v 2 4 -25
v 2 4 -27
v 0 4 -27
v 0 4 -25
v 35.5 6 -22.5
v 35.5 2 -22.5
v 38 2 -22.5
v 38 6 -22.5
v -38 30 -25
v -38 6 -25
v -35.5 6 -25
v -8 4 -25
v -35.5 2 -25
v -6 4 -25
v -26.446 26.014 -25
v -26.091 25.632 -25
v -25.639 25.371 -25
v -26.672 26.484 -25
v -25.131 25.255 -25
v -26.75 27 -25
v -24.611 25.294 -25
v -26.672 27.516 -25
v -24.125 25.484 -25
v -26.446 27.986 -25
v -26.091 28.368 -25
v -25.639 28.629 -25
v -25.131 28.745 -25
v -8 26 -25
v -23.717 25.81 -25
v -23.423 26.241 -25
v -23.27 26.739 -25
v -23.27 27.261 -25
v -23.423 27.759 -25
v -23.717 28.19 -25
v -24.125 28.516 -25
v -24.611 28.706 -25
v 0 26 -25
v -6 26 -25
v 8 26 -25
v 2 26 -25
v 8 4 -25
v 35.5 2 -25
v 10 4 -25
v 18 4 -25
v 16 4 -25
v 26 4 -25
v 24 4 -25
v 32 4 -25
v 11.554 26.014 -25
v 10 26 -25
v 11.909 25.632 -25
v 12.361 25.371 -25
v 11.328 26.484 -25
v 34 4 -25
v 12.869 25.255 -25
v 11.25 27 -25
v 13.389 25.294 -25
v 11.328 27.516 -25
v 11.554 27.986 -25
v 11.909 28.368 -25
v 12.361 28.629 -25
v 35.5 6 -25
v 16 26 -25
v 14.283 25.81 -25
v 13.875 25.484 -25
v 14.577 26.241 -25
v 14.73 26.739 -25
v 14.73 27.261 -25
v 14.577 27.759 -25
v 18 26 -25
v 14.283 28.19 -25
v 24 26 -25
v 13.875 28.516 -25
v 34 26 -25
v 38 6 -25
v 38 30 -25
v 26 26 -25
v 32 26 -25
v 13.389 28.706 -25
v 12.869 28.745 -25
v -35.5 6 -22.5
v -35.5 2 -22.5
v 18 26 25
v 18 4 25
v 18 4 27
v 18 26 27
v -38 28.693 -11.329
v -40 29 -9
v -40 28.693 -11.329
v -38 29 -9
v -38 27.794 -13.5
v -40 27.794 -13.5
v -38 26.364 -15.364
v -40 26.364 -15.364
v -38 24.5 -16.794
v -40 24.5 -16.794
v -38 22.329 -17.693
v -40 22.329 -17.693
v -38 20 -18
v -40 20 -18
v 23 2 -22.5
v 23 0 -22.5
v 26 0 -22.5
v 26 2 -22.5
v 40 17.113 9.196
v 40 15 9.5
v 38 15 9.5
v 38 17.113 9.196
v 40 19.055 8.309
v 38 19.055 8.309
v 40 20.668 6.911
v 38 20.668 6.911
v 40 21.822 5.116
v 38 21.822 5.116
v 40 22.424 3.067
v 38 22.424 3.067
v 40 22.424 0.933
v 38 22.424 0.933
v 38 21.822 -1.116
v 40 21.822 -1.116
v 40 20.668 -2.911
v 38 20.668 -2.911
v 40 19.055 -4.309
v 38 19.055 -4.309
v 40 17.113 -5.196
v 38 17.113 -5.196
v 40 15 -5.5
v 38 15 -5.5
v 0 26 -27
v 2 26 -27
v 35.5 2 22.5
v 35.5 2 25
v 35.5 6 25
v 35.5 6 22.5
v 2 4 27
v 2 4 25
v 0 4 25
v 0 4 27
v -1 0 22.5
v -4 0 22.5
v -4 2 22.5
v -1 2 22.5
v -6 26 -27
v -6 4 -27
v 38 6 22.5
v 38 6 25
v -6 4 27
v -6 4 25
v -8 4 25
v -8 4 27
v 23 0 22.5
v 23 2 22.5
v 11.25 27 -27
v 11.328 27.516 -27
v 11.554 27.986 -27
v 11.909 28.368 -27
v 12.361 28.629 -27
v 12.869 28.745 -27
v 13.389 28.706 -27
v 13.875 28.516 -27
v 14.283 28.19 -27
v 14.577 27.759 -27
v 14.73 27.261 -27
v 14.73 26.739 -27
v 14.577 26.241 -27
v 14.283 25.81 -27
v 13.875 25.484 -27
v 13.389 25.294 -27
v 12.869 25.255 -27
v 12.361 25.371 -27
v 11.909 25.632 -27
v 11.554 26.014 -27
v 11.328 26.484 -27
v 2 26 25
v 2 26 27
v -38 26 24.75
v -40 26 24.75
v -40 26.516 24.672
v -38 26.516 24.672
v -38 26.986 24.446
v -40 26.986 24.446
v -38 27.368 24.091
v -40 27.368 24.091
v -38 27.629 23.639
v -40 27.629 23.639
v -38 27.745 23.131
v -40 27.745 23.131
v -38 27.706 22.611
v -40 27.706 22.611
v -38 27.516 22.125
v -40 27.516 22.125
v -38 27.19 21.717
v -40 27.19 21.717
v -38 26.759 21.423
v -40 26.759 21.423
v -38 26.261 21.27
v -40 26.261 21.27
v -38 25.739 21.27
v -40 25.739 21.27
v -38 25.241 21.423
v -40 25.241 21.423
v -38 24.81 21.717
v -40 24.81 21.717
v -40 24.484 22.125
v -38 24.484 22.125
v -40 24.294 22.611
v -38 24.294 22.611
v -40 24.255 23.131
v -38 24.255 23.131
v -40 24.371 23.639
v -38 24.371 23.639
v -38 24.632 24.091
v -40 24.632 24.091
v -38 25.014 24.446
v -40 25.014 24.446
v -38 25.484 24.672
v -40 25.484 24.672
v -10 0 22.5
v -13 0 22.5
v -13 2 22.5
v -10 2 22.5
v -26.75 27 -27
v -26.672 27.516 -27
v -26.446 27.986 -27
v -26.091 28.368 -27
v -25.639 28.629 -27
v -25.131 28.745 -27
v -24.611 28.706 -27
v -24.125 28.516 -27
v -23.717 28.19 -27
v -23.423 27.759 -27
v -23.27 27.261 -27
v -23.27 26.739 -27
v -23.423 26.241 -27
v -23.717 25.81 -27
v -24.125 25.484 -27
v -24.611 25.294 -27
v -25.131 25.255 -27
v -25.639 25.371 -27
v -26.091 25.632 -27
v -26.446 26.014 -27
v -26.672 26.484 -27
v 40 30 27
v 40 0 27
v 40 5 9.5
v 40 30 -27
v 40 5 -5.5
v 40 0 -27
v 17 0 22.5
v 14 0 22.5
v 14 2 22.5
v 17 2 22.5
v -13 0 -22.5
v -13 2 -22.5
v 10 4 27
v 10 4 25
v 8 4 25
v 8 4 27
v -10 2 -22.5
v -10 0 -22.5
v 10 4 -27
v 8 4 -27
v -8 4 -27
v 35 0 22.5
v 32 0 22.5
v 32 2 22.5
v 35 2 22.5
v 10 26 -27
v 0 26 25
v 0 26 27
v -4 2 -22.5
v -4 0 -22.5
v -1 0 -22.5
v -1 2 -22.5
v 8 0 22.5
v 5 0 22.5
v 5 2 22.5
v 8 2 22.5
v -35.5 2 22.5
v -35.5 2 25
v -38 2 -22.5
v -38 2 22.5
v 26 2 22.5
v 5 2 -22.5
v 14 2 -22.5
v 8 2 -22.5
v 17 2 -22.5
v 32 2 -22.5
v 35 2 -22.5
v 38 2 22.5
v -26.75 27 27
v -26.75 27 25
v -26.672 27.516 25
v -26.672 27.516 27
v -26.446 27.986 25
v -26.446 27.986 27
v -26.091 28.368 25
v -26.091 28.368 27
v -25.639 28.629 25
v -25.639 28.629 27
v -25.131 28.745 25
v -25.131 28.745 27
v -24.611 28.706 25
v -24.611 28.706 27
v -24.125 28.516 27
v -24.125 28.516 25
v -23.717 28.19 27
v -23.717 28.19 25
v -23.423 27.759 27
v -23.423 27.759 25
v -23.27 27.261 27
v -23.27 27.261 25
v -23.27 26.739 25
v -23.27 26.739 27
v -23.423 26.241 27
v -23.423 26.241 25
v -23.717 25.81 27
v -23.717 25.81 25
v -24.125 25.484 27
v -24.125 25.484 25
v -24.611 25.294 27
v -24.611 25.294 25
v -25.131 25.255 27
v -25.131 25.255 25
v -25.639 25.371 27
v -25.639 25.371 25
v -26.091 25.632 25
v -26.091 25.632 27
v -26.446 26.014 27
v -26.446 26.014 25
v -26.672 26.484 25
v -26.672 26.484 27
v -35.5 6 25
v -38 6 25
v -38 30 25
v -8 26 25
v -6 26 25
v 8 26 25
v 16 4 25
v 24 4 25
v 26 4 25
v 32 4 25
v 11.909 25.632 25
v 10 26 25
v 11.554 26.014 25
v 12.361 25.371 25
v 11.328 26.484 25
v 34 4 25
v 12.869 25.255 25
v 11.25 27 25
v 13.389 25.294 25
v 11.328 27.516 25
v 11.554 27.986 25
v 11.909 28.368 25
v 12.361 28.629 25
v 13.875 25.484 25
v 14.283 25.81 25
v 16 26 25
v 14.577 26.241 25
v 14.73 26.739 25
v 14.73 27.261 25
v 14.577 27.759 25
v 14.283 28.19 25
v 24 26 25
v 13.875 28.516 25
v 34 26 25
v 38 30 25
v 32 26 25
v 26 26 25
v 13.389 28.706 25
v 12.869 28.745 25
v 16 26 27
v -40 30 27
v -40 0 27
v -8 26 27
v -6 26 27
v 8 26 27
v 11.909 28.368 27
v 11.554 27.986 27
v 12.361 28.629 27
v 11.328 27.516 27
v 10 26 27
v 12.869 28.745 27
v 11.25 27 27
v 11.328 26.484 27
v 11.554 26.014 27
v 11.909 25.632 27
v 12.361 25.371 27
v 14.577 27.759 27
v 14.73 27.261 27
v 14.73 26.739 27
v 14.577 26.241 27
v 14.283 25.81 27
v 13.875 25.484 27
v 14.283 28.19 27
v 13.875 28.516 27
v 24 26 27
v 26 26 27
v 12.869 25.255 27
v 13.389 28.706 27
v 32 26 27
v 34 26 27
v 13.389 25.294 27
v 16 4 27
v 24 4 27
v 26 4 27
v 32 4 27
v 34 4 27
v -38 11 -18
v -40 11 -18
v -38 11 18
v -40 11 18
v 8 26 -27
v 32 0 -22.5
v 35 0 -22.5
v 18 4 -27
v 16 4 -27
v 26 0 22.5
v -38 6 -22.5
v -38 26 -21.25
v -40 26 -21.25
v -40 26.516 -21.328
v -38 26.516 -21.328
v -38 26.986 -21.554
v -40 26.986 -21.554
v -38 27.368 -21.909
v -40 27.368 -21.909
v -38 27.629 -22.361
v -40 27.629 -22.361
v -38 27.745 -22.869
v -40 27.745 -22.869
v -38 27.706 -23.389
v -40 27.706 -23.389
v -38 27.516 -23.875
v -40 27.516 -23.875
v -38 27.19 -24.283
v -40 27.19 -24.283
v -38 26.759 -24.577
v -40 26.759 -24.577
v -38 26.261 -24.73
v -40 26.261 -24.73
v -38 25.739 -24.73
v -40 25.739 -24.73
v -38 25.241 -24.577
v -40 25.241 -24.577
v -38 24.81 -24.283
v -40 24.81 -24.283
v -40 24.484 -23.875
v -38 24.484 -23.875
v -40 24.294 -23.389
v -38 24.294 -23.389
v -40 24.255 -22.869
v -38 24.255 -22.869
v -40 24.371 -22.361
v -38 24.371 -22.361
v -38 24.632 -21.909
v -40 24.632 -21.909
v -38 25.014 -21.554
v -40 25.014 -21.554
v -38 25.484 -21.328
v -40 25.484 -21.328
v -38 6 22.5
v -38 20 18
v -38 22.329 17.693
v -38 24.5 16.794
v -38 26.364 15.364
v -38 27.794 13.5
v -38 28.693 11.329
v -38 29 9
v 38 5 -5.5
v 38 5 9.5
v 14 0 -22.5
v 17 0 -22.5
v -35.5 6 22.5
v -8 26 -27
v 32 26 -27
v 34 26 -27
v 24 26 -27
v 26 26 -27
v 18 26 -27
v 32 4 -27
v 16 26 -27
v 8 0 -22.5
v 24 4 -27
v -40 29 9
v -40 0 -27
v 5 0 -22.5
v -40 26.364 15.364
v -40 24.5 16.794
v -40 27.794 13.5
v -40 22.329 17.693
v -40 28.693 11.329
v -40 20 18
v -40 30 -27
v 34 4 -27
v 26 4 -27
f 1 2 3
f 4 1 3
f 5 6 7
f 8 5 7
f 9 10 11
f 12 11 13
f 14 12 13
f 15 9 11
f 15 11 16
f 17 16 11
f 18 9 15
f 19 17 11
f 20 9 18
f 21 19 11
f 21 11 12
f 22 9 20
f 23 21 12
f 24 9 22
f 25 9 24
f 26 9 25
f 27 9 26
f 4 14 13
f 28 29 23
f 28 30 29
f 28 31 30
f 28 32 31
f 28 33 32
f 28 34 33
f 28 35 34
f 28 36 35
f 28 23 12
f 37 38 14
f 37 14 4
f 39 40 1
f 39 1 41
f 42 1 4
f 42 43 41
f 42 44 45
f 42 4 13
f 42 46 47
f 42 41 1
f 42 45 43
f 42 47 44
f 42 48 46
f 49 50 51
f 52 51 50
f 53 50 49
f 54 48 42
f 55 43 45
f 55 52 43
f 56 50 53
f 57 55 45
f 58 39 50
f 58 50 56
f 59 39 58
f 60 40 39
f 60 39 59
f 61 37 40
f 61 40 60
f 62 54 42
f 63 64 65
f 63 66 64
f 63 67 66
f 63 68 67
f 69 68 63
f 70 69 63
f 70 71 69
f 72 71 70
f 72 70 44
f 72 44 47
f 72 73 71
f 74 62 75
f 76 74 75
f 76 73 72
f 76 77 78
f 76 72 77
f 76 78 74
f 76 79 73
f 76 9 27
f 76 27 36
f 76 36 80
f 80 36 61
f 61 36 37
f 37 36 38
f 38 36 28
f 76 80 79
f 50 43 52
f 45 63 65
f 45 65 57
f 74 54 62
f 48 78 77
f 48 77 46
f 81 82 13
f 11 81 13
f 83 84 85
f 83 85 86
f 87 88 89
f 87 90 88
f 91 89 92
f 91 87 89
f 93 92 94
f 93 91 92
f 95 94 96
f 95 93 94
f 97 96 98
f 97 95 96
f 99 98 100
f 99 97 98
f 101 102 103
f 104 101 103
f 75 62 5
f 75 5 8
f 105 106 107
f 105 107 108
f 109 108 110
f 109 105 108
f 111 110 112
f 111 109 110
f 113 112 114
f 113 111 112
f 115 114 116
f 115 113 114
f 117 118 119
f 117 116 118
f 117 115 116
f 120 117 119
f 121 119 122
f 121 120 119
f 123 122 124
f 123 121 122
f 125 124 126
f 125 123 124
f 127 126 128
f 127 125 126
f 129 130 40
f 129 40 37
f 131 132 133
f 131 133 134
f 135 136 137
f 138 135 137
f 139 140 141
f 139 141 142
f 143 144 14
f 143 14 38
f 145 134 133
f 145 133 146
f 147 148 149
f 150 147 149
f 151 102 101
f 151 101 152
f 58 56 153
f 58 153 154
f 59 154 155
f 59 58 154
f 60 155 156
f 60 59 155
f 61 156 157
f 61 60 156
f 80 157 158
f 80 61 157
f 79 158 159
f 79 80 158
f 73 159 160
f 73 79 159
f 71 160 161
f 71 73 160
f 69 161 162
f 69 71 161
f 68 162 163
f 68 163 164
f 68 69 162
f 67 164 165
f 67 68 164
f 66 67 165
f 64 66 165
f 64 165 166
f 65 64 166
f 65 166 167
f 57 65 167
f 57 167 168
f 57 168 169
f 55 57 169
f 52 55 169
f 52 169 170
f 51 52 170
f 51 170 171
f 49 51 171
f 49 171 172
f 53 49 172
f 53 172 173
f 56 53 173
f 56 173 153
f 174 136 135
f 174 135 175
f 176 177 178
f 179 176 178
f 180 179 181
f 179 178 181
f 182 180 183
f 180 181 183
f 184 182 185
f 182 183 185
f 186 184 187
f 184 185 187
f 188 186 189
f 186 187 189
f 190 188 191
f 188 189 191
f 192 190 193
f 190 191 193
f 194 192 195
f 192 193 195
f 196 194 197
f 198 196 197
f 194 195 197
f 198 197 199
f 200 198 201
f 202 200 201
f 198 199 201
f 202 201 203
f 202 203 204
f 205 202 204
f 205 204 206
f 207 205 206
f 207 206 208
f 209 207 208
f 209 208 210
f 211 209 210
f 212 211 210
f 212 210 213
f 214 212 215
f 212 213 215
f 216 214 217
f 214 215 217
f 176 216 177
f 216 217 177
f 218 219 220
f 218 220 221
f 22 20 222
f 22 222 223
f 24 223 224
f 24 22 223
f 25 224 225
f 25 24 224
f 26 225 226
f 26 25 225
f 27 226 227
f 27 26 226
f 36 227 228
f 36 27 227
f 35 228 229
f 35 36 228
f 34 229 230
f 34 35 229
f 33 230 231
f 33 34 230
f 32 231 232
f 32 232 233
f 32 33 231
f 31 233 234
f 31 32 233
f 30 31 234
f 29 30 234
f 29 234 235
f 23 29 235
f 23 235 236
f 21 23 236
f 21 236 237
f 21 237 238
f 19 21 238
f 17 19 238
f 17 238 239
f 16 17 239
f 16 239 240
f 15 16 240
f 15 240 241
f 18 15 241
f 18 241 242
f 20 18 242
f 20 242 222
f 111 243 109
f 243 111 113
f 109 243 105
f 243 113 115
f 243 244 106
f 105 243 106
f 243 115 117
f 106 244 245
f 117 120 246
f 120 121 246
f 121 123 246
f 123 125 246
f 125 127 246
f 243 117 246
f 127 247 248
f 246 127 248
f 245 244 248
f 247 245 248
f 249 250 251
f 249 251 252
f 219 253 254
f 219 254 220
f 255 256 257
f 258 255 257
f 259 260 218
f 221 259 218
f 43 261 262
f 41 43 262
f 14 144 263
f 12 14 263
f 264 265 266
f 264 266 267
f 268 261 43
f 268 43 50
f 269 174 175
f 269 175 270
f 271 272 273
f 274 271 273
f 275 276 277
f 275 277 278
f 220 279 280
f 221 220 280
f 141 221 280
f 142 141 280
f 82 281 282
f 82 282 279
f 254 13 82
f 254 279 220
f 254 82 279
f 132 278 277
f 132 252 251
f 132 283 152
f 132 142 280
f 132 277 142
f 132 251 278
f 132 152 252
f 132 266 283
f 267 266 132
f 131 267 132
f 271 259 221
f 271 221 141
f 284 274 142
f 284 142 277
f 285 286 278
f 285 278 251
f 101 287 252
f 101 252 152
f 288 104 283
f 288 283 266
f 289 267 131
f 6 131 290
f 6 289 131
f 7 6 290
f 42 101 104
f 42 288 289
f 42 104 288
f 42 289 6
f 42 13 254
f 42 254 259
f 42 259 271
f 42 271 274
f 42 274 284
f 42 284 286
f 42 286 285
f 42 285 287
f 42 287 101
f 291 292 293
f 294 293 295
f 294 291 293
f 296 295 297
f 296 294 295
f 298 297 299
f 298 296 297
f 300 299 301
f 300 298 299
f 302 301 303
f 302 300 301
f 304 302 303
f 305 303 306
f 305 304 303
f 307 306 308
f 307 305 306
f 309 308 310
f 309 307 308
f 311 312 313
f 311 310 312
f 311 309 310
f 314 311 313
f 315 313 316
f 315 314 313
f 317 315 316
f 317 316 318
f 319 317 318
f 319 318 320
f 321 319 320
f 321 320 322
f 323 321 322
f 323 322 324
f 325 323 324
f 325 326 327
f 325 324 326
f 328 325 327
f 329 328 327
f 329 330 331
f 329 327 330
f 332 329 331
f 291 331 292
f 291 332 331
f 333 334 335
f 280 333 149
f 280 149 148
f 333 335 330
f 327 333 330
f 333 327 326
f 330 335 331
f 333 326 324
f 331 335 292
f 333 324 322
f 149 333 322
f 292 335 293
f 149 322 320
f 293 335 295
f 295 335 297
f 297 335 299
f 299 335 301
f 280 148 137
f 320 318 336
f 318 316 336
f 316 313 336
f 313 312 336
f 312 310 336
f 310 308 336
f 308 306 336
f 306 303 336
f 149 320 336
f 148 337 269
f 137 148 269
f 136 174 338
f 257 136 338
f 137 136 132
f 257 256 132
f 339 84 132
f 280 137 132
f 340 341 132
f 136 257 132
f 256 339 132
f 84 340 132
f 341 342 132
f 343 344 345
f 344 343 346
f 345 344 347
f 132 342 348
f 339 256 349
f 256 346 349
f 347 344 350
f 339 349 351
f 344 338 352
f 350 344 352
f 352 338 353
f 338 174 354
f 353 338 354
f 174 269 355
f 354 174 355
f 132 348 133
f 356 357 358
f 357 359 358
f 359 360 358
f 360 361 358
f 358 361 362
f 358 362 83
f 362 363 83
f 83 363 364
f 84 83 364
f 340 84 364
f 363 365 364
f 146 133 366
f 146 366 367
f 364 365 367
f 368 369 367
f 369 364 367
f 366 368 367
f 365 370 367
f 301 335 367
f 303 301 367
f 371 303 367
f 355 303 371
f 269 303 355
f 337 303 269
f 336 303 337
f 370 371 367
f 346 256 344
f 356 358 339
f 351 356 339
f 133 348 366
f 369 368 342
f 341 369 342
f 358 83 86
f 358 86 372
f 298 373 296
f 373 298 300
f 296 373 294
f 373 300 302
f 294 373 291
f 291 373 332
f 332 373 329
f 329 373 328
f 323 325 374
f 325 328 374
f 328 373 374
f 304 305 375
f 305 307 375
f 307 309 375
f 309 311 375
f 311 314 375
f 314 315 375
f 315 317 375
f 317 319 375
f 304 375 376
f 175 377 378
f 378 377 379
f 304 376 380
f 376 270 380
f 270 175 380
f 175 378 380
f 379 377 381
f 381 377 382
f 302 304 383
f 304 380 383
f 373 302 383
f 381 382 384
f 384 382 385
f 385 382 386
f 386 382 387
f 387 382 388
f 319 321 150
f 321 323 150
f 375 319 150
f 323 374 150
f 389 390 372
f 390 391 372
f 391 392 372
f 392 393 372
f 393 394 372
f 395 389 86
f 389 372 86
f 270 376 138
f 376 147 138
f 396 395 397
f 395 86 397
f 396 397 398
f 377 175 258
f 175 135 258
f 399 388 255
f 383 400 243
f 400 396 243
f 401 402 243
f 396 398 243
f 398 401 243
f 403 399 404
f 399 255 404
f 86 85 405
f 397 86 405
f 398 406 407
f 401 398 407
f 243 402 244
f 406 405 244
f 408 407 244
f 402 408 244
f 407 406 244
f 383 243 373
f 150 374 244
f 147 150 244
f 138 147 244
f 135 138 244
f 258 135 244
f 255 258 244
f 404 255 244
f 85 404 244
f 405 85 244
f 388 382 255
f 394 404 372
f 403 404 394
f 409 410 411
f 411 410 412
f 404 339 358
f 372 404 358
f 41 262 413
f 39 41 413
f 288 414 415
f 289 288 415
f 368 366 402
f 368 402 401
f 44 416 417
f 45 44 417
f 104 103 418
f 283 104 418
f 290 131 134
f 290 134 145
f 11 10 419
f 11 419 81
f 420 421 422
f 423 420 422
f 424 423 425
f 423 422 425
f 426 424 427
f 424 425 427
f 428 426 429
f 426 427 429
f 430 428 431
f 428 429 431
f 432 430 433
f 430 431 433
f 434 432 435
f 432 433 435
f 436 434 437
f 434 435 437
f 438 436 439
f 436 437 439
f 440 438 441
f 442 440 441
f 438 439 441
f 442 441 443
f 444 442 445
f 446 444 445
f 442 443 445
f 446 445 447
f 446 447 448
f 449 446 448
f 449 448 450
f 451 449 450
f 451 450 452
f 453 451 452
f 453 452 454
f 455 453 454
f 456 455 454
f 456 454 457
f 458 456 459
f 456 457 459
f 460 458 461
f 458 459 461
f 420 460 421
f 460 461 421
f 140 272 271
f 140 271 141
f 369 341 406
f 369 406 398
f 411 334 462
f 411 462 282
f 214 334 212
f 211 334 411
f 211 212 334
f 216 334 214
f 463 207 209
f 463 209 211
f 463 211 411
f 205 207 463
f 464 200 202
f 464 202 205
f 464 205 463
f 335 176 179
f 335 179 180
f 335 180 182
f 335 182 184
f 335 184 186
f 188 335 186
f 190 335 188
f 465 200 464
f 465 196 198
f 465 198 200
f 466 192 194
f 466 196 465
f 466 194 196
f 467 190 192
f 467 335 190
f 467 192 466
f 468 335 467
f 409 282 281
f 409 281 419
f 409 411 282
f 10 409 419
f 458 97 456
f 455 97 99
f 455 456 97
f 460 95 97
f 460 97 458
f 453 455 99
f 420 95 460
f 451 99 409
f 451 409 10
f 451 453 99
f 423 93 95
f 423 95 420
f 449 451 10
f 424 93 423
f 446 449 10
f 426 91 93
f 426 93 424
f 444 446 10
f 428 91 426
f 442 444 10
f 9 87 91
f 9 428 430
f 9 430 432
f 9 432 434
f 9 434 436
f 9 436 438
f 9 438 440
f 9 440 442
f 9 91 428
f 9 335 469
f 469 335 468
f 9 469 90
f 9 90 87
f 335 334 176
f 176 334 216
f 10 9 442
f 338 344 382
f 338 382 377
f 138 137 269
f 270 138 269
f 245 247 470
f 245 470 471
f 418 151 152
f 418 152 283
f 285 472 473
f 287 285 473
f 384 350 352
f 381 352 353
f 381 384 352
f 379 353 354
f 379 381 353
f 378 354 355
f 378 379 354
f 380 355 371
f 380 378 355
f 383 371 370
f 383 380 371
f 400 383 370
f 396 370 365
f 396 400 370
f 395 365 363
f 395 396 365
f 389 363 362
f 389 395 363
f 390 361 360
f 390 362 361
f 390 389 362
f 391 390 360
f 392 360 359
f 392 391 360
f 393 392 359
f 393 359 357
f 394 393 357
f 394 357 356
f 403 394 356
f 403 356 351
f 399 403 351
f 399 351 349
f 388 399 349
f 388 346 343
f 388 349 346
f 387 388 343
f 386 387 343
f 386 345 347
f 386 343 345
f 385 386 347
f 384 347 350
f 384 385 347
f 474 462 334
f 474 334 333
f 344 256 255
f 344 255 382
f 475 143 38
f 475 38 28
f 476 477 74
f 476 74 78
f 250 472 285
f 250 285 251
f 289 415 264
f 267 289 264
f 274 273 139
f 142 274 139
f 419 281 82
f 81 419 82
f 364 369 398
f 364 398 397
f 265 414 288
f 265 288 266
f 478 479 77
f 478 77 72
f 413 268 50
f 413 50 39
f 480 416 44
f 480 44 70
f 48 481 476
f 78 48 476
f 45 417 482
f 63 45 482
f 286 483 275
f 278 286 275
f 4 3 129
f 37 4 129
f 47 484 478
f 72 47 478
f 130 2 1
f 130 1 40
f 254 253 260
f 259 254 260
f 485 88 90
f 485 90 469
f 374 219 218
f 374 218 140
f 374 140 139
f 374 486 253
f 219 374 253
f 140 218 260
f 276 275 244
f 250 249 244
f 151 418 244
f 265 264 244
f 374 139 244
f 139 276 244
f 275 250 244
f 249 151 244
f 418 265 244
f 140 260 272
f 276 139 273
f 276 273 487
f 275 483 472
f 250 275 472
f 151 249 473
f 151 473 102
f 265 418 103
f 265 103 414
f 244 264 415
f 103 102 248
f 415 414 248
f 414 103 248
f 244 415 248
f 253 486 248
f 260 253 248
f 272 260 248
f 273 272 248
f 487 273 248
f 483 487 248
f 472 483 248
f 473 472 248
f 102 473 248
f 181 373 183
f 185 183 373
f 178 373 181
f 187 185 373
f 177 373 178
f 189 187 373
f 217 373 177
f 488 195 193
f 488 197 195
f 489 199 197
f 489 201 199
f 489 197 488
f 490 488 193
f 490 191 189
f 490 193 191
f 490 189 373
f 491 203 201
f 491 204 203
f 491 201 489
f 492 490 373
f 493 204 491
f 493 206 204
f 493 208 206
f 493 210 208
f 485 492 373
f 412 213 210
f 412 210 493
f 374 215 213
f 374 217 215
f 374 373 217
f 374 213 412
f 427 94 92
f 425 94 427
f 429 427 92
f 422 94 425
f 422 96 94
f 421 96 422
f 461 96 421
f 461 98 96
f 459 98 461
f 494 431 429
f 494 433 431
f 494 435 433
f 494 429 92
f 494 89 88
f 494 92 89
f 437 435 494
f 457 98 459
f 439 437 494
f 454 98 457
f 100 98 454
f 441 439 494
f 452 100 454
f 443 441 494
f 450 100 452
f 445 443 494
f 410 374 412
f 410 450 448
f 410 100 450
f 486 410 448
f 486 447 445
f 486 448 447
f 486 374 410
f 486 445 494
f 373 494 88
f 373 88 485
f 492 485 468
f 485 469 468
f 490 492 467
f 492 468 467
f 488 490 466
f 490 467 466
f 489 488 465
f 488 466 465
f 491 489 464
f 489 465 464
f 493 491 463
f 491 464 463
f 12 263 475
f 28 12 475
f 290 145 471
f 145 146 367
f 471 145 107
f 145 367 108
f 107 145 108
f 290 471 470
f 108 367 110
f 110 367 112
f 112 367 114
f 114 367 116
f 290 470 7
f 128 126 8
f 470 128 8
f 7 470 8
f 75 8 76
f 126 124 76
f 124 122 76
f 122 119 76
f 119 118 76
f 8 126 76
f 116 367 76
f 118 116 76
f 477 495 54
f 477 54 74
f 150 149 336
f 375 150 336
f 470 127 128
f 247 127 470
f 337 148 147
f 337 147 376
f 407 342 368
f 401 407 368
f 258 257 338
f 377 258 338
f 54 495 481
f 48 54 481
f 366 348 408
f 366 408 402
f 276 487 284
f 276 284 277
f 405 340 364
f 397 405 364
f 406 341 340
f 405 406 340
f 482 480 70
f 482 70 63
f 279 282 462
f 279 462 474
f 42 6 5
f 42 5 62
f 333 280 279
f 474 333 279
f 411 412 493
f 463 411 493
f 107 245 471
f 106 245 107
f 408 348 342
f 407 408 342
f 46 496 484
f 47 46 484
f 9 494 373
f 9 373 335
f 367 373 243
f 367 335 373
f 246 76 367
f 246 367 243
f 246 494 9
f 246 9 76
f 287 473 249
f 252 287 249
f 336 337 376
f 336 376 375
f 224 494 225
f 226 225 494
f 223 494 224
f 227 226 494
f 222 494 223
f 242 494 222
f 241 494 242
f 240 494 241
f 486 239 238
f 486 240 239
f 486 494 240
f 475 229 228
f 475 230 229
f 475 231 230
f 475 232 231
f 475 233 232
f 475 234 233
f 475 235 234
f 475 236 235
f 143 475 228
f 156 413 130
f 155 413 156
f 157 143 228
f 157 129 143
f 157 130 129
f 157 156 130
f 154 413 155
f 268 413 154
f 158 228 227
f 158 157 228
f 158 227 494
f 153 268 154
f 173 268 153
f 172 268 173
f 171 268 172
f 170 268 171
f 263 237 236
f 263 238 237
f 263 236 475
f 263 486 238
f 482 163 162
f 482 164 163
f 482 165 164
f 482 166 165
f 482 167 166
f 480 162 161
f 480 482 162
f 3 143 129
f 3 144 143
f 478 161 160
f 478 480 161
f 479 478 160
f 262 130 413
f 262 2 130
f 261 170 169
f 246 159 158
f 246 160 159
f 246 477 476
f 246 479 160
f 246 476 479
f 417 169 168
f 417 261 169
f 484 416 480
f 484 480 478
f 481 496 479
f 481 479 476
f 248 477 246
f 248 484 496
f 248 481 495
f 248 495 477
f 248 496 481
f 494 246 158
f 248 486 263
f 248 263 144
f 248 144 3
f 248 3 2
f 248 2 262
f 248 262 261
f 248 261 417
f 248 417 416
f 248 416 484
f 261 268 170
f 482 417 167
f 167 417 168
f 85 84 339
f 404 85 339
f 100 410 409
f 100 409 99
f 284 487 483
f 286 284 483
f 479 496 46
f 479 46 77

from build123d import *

# Parameters (mm, degrees)
SKETCH1_W           = 80
SKETCH1_H           = 54
BOSS_EXTRUDE1_DEPTH = 30
SKETCH2_W           = 76
SKETCH2_H           = 50
CUT_EXTRUDE1_DEPTH  = 28
CUT_EXTRUDE2_DEPTH  = 6
SKETCH4_W           = 36
SKETCH4_H           = 18
CUT_EXTRUDE3_DEPTH  = 6
SKETCH5_W           = 2.5
SKETCH5_H           = 2.5
STANDOFFS_DEPTH     = 4
FILLET3_R           = 9
FILLET4_R           = 9
SKETCH6_W           = 3
SKETCH6_H           = 45
BOTTOM_GRILL_DEPTH  = 2
CUT_EXTRUDE5_REACH  = 75.593
SKETCH7_W           = 2
SKETCH7_H           = 22
CUT_EXTRUDE6_START  = -54
SKETCH8_R           = 1.75
CUT_EXTRUDE6_DEPTH  = 54
SKETCH9_R           = 1.75
CUT_EXTRUDE7_DEPTH  = 2


with BuildPart() as part:
    # Sketch1 → Boss-Extrude1 (new body)
    with BuildSketch(Plane(origin=(0, 0, 0), x_dir=(1, 0, 0), z_dir=(0, 1, 0))):
        Rectangle(SKETCH1_W, SKETCH1_H)
    extrude(amount=BOSS_EXTRUDE1_DEPTH)

    # Sketch2 → Cut-Extrude1 (cut)
    with BuildSketch(Plane(origin=(0, 30, 0), x_dir=(1, 0, 0), z_dir=(0, 1, 0))):
        Rectangle(SKETCH2_W, SKETCH2_H)
    extrude(amount=-CUT_EXTRUDE1_DEPTH, mode=Mode.SUBTRACT)

    # Sketch3 → Cut-Extrude2 (cut)
    with BuildSketch(Plane(origin=(40, 0, 0), x_dir=(0, 0, -1), z_dir=(1, 0, 0))):
        with BuildLine():
            Line((5.5, 15), (5.5, 5))
            Line((5.5, 5), (-9.5, 5))
            Line((-9.5, 5), (-9.5, 15))
            ThreePointArc((-9.5, 15), (-2, 22.5), (5.5, 15))
        make_face()
    extrude(amount=-CUT_EXTRUDE2_DEPTH, mode=Mode.SUBTRACT)

    # Sketch4 → Cut-Extrude3 (cut)
    with BuildSketch(Plane.ZY.offset(40)):
        with Locations((0, 20)):
            Rectangle(SKETCH4_W, SKETCH4_H)
    extrude(amount=-CUT_EXTRUDE3_DEPTH, mode=Mode.SUBTRACT)

    # Sketch5 → Standoffs (add)
    with BuildSketch(Plane(origin=(0, 2, 0), x_dir=(1, 0, 0), z_dir=(0, 1, 0))):
        with Locations((36.75, 23.75)):
            Rectangle(SKETCH5_W, SKETCH5_H)
        with Locations((36.75, -23.75)):
            Rectangle(SKETCH5_W, SKETCH5_H)
        with Locations((-36.75, -23.75)):
            Rectangle(SKETCH5_W, SKETCH5_H)
        with Locations((-36.75, 23.75)):
            Rectangle(SKETCH5_W, SKETCH5_H)
    extrude(amount=STANDOFFS_DEPTH)

    # Fillet3
    fillet3_edges = [part.edges().sort_by_distance(p)[0] for p in [
        (-39, 29, -18),
    ]]
    fillet(fillet3_edges, radius=FILLET3_R)

    # Fillet4
    fillet4_edges = [part.edges().sort_by_distance(p)[0] for p in [
        (-39, 29, 18),
    ]]
    fillet(fillet4_edges, radius=FILLET4_R)

    # Sketch6 → Bottom Grill (cut)
    with BuildSketch(Plane.XZ):
        with Locations((33.5, 0)):
            Rectangle(SKETCH6_W, SKETCH6_H)
        with Locations((24.5, 0)):
            Rectangle(SKETCH6_W, SKETCH6_H)
        with Locations((15.5, 0)):
            Rectangle(SKETCH6_W, SKETCH6_H)
        with Locations((6.5, 0)):
            Rectangle(SKETCH6_W, SKETCH6_H)
        with Locations((-2.5, 0)):
            Rectangle(SKETCH6_W, SKETCH6_H)
        with Locations((-11.5, 0)):
            Rectangle(SKETCH6_W, SKETCH6_H)
    extrude(amount=-BOTTOM_GRILL_DEPTH, mode=Mode.SUBTRACT)

    # Cut-Extrude5: up to this face of the body (flat: up to its plane)
    cut_extrude5_end = Plane(part.part.faces().sort_by_distance((0, 15, 27))[0])
    # Sketch7 → Cut-Extrude5 (cut, up to the picked face)
    with BuildSketch(Plane(origin=(0, 0, -27), x_dir=(-1, 0, 0), z_dir=(0, 0, -1)), mode=Mode.PRIVATE) as cut_extrude5_sk1:
        with Locations((-33, 15)):
            Rectangle(SKETCH7_W, SKETCH7_H)
    cut_extrude5_tool1 = split(extrude(cut_extrude5_sk1.sketch, amount=-CUT_EXTRUDE5_REACH, mode=Mode.PRIVATE), bisect_by=cut_extrude5_end, keep=Keep.BOTH, mode=Mode.PRIVATE)
    # Sketch7 → Cut-Extrude5 (cut, up to the picked face)
    with BuildSketch(Plane(origin=(0, 0, -27), x_dir=(-1, 0, 0), z_dir=(0, 0, -1)), mode=Mode.PRIVATE) as cut_extrude5_sk2:
        with Locations((-25, 15)):
            Rectangle(SKETCH7_W, SKETCH7_H)
    cut_extrude5_tool2 = split(extrude(cut_extrude5_sk2.sketch, amount=-CUT_EXTRUDE5_REACH, mode=Mode.PRIVATE), bisect_by=cut_extrude5_end, keep=Keep.BOTH, mode=Mode.PRIVATE)
    # Sketch7 → Cut-Extrude5 (cut, up to the picked face)
    with BuildSketch(Plane(origin=(0, 0, -27), x_dir=(-1, 0, 0), z_dir=(0, 0, -1)), mode=Mode.PRIVATE) as cut_extrude5_sk3:
        with Locations((-17, 15)):
            Rectangle(SKETCH7_W, SKETCH7_H)
    cut_extrude5_tool3 = split(extrude(cut_extrude5_sk3.sketch, amount=-CUT_EXTRUDE5_REACH, mode=Mode.PRIVATE), bisect_by=cut_extrude5_end, keep=Keep.BOTH, mode=Mode.PRIVATE)
    # Sketch7 → Cut-Extrude5 (cut, up to the picked face)
    with BuildSketch(Plane(origin=(0, 0, -27), x_dir=(-1, 0, 0), z_dir=(0, 0, -1)), mode=Mode.PRIVATE) as cut_extrude5_sk4:
        with Locations((-9, 15)):
            Rectangle(SKETCH7_W, SKETCH7_H)
    cut_extrude5_tool4 = split(extrude(cut_extrude5_sk4.sketch, amount=-CUT_EXTRUDE5_REACH, mode=Mode.PRIVATE), bisect_by=cut_extrude5_end, keep=Keep.BOTH, mode=Mode.PRIVATE)
    # Sketch7 → Cut-Extrude5 (cut, up to the picked face)
    with BuildSketch(Plane(origin=(0, 0, -27), x_dir=(-1, 0, 0), z_dir=(0, 0, -1)), mode=Mode.PRIVATE) as cut_extrude5_sk5:
        with Locations((-1, 15)):
            Rectangle(SKETCH7_W, SKETCH7_H)
    cut_extrude5_tool5 = split(extrude(cut_extrude5_sk5.sketch, amount=-CUT_EXTRUDE5_REACH, mode=Mode.PRIVATE), bisect_by=cut_extrude5_end, keep=Keep.BOTH, mode=Mode.PRIVATE)
    # Sketch7 → Cut-Extrude5 (cut, up to the picked face)
    with BuildSketch(Plane(origin=(0, 0, -27), x_dir=(-1, 0, 0), z_dir=(0, 0, -1)), mode=Mode.PRIVATE) as cut_extrude5_sk6:
        with Locations((7, 15)):
            Rectangle(SKETCH7_W, SKETCH7_H)
    cut_extrude5_tool6 = split(extrude(cut_extrude5_sk6.sketch, amount=-CUT_EXTRUDE5_REACH, mode=Mode.PRIVATE), bisect_by=cut_extrude5_end, keep=Keep.BOTH, mode=Mode.PRIVATE)
    add(cut_extrude5_tool1.solids().sort_by(Axis((33, 15, -27), (0, 0, 1)))[0], mode=Mode.SUBTRACT)
    add(cut_extrude5_tool2.solids().sort_by(Axis((25, 15, -27), (0, 0, 1)))[0], mode=Mode.SUBTRACT)
    add(cut_extrude5_tool3.solids().sort_by(Axis((17, 15, -27), (0, 0, 1)))[0], mode=Mode.SUBTRACT)
    add(cut_extrude5_tool4.solids().sort_by(Axis((9, 15, -27), (0, 0, 1)))[0], mode=Mode.SUBTRACT)
    add(cut_extrude5_tool5.solids().sort_by(Axis((1, 15, -27), (0, 0, 1)))[0], mode=Mode.SUBTRACT)
    add(cut_extrude5_tool6.solids().sort_by(Axis((-7, 15, -27), (0, 0, 1)))[0], mode=Mode.SUBTRACT)

    # Sketch8 → Cut-Extrude6 (cut)
    with BuildSketch(Plane(origin=(0, 0, -27), x_dir=(-1, 0, 0), z_dir=(0, 0, -1)).offset(CUT_EXTRUDE6_START)):
        with Locations((-13, 27)):
            Circle(SKETCH8_R)
        with Locations((25, 27)):
            Circle(SKETCH8_R)
    extrude(amount=CUT_EXTRUDE6_DEPTH, mode=Mode.SUBTRACT)

    # Sketch9 → Cut-Extrude7 (cut)
    with BuildSketch(Plane.ZY.offset(40)):
        with Locations((-23, 26)):
            Circle(SKETCH9_R)
        with Locations((23, 26)):
            Circle(SKETCH9_R)
    extrude(amount=-CUT_EXTRUDE7_DEPTH, mode=Mode.SUBTRACT)


solid = part.part
